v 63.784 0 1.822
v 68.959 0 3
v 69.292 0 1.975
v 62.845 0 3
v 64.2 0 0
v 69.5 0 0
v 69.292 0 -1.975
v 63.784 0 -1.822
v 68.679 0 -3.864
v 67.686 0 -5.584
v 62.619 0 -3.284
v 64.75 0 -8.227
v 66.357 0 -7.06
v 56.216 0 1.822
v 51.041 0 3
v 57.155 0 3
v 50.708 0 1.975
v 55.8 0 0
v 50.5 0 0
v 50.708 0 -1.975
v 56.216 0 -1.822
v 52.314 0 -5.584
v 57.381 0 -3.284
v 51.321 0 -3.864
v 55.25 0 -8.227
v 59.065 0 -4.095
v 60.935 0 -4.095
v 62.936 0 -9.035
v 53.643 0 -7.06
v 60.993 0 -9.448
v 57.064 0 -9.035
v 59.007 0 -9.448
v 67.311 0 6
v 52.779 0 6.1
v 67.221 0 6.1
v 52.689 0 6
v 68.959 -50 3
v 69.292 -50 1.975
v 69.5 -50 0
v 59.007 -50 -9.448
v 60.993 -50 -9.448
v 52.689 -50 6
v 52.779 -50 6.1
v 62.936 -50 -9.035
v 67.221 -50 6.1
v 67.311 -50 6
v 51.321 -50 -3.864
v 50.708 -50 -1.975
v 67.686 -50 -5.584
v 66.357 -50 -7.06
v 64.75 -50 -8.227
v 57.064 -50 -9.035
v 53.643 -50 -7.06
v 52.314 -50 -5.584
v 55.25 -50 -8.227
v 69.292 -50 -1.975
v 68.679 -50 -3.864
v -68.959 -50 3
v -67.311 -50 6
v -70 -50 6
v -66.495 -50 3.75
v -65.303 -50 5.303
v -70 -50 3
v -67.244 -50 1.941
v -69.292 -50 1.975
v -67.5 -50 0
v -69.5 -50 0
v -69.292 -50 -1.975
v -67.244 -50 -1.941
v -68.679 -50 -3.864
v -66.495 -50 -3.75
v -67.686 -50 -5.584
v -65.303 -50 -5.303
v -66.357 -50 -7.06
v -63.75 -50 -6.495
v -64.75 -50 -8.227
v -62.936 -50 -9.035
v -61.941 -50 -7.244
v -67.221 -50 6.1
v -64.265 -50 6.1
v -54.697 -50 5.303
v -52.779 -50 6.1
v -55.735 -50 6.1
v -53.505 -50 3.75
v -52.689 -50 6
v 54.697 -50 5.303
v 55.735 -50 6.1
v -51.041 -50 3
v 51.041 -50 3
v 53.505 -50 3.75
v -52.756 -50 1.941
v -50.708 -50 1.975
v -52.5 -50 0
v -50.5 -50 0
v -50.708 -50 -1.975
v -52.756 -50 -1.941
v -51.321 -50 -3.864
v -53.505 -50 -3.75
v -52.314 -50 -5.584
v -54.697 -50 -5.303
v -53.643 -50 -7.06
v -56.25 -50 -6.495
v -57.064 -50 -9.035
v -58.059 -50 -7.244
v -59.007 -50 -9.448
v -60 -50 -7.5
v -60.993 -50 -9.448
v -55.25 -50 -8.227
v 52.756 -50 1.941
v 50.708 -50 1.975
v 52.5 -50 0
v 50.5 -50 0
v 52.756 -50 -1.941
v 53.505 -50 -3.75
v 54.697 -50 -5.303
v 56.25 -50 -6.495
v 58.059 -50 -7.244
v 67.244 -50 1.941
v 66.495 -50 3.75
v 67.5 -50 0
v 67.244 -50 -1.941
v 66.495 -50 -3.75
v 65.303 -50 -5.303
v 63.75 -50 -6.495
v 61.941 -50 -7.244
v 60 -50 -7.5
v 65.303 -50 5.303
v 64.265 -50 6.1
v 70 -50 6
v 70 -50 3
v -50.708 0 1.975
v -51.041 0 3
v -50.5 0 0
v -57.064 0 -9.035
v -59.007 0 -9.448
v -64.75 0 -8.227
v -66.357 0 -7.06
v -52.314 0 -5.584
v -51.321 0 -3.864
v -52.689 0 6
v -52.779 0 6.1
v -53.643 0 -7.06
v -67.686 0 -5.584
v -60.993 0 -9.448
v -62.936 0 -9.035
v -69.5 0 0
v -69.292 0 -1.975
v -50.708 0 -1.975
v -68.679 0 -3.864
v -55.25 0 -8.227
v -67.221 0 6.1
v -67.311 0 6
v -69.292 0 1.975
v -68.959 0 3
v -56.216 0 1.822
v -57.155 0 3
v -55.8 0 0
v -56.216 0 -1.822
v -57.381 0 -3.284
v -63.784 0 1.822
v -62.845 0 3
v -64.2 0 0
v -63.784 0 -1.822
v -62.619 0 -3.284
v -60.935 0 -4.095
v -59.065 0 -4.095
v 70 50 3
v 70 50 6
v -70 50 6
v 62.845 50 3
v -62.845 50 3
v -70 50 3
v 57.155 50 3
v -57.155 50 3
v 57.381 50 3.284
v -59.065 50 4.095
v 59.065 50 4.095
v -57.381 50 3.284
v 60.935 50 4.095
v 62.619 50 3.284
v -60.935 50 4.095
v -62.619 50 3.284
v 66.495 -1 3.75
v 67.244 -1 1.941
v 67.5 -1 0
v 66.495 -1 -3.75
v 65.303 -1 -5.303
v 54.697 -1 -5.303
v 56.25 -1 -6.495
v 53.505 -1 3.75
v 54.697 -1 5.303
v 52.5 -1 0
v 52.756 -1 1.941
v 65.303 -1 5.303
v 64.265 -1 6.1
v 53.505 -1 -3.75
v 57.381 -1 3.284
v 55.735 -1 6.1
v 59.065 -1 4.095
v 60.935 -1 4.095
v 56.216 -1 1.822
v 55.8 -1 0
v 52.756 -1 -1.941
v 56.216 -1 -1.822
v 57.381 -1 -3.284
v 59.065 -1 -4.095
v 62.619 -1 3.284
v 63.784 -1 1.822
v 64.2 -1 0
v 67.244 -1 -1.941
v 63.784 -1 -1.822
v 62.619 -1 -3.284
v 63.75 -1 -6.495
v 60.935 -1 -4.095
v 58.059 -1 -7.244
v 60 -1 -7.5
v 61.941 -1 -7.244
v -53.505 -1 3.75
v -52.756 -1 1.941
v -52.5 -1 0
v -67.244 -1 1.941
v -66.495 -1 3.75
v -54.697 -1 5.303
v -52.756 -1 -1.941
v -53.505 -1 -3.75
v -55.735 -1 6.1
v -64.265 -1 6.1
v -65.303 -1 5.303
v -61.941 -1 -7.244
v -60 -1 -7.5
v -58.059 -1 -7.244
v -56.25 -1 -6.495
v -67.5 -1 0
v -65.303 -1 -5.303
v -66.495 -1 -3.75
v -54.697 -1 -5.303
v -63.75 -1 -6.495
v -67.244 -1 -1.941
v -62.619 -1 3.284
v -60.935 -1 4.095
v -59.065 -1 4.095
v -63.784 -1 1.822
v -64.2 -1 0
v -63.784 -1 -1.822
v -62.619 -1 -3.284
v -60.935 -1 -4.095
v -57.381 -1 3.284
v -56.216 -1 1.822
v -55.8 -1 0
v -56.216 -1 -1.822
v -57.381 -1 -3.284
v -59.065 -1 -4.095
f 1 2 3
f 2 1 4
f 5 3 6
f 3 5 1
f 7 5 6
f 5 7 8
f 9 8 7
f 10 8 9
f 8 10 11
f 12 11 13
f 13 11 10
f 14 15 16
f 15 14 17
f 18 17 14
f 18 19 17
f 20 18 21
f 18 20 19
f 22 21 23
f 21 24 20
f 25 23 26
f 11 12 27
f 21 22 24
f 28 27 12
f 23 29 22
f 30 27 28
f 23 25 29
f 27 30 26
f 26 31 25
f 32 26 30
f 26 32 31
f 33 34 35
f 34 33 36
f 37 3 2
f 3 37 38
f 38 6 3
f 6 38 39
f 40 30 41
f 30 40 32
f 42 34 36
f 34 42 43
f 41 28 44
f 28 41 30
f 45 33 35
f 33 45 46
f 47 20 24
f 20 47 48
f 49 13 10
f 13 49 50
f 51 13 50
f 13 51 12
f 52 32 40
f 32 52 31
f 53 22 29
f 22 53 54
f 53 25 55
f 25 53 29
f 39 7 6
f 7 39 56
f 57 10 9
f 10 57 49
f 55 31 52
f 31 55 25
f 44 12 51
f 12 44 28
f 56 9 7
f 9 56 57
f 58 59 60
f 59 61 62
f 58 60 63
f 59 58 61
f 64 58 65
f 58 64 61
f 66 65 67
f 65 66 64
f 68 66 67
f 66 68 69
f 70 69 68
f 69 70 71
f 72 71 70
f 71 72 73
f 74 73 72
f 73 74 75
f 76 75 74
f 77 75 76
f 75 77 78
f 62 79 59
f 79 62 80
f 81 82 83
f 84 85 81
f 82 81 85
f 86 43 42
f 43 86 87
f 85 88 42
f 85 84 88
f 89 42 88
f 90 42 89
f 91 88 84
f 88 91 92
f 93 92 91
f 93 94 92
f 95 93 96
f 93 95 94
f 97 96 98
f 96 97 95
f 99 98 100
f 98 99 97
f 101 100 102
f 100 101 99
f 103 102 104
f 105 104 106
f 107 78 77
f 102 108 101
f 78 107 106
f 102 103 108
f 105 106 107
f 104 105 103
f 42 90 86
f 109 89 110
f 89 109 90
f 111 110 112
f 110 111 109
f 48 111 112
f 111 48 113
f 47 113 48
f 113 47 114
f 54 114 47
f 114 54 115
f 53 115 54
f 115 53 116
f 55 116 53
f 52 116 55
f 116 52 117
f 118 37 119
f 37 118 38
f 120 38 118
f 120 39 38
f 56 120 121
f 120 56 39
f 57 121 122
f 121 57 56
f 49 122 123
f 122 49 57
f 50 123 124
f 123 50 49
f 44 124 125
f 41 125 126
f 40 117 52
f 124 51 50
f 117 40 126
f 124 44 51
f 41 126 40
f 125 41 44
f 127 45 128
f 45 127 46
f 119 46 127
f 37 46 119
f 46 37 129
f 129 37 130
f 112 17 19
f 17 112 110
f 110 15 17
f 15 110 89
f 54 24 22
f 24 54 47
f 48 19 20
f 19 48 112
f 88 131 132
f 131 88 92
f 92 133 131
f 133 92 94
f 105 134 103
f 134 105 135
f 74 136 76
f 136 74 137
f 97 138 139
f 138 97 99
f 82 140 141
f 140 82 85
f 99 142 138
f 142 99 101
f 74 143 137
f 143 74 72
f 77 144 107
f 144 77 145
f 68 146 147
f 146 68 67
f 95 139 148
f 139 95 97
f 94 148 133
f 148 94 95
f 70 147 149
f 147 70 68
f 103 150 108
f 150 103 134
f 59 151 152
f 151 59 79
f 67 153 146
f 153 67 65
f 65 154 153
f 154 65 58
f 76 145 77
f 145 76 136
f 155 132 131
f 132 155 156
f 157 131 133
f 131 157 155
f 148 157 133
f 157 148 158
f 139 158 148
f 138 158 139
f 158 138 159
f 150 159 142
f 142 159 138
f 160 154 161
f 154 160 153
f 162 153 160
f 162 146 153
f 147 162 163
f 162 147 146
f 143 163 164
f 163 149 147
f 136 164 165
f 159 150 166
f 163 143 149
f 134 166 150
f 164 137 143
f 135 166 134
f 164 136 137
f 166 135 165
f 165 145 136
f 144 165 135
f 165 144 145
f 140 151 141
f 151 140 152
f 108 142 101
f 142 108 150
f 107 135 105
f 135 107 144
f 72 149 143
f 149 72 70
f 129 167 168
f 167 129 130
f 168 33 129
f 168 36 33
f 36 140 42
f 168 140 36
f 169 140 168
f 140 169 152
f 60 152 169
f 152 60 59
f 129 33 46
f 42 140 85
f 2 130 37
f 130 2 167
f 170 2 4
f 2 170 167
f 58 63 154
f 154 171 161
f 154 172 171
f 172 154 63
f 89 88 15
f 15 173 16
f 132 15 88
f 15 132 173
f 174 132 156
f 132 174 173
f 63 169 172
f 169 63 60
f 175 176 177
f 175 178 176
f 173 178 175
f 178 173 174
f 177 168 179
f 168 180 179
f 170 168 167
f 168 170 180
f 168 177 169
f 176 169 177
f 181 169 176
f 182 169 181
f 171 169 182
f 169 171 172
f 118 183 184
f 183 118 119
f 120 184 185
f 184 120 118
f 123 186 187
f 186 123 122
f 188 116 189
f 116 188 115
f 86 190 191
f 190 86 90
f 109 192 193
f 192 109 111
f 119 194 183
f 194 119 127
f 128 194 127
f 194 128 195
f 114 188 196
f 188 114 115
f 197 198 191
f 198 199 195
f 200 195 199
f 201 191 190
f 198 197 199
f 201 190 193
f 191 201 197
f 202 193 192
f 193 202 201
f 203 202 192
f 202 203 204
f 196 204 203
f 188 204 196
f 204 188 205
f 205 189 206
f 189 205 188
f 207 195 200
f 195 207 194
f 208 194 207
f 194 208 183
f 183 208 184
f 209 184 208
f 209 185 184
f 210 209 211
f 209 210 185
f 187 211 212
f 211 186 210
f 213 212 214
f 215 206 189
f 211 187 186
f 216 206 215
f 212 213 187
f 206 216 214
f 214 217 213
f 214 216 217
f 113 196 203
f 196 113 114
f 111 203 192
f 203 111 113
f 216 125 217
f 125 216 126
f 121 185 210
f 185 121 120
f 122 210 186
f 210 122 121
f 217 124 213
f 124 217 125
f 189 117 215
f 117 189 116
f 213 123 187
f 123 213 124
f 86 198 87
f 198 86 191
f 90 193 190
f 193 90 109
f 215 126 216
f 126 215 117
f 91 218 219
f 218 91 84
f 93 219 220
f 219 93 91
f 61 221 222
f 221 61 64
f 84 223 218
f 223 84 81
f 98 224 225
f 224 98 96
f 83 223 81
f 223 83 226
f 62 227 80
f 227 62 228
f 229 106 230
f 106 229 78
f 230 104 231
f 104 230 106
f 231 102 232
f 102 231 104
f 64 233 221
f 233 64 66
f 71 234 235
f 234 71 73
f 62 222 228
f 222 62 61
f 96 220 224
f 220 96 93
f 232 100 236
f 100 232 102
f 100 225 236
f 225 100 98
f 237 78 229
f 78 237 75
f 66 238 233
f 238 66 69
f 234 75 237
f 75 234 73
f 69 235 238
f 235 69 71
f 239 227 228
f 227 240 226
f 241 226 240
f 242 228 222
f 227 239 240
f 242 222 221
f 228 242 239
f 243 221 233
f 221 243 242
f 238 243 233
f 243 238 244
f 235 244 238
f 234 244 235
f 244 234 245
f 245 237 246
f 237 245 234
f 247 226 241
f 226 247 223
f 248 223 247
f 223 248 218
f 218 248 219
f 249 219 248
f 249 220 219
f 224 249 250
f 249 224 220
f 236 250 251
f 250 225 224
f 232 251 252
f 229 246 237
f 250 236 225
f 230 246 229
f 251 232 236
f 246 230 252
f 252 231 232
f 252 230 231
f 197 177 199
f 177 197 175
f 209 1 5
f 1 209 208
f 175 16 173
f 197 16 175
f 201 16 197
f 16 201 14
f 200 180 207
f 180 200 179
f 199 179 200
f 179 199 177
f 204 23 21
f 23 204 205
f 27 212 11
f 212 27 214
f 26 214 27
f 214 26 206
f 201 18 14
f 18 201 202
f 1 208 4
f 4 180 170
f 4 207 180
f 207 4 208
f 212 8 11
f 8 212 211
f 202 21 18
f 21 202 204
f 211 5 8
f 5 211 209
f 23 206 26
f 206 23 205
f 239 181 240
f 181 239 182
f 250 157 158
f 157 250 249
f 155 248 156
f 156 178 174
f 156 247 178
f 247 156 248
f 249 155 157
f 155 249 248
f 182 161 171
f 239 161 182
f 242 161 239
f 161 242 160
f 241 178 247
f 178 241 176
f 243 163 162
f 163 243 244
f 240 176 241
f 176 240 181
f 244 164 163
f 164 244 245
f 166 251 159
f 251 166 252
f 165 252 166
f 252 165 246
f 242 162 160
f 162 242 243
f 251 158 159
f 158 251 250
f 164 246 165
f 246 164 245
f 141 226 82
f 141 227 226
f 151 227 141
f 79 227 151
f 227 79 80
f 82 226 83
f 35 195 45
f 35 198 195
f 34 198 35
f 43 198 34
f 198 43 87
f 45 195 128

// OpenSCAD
difference(){

union(){

// Bloques rodamientos

translate([120/2,0,0])rotate([90,0,0]) cylinder(h=24*2+2,r=15/2+2);
translate([-(120/2),0,0])rotate([90,0,0]) cylinder(h=24*2+2,r=15/2+2);

//translate([-140/2-15/2-2,-(24*2+2),(-15/2-2-5)]) cube([19,24*2+2,-(-15/2-2-5)]);

//translate([140/2-15/2-2,-(24*2+2),(-15/2-2-5)]) cube([19,24*2+2,-(-15/2-2-5)]);

translate([-140/2,-24*2-2,3])cube([140,100,4+2-3]);

}

union(){
// Rodamientos
translate([120/2,-1,0])rotate([90,0,0]) cylinder(h=24*2+4,r=15/2);
translate([-120/2,-1,0])rotate([90,0,0]) cylinder(h=24*2+4,r=15/2);

// Varillas
translate([120/2,500,0])rotate([90,0,0]) cylinder(h=1000,r=4.2);
translate([-120/2,500,0])rotate([90,0,0]) cylinder(h=1000,r=4.2);

translate([-140/2,-24*2-2,6.1])cube([140,100,2.1+100]);

}
}

//translate([-140/2-19/2,-50,-1])cube([140+19,24+24+2,2]);
//translate([-140/2,-20,-5])cube([140,20,5]);
//translate([-20/2,-50,-10])cube([20,50,10]);
